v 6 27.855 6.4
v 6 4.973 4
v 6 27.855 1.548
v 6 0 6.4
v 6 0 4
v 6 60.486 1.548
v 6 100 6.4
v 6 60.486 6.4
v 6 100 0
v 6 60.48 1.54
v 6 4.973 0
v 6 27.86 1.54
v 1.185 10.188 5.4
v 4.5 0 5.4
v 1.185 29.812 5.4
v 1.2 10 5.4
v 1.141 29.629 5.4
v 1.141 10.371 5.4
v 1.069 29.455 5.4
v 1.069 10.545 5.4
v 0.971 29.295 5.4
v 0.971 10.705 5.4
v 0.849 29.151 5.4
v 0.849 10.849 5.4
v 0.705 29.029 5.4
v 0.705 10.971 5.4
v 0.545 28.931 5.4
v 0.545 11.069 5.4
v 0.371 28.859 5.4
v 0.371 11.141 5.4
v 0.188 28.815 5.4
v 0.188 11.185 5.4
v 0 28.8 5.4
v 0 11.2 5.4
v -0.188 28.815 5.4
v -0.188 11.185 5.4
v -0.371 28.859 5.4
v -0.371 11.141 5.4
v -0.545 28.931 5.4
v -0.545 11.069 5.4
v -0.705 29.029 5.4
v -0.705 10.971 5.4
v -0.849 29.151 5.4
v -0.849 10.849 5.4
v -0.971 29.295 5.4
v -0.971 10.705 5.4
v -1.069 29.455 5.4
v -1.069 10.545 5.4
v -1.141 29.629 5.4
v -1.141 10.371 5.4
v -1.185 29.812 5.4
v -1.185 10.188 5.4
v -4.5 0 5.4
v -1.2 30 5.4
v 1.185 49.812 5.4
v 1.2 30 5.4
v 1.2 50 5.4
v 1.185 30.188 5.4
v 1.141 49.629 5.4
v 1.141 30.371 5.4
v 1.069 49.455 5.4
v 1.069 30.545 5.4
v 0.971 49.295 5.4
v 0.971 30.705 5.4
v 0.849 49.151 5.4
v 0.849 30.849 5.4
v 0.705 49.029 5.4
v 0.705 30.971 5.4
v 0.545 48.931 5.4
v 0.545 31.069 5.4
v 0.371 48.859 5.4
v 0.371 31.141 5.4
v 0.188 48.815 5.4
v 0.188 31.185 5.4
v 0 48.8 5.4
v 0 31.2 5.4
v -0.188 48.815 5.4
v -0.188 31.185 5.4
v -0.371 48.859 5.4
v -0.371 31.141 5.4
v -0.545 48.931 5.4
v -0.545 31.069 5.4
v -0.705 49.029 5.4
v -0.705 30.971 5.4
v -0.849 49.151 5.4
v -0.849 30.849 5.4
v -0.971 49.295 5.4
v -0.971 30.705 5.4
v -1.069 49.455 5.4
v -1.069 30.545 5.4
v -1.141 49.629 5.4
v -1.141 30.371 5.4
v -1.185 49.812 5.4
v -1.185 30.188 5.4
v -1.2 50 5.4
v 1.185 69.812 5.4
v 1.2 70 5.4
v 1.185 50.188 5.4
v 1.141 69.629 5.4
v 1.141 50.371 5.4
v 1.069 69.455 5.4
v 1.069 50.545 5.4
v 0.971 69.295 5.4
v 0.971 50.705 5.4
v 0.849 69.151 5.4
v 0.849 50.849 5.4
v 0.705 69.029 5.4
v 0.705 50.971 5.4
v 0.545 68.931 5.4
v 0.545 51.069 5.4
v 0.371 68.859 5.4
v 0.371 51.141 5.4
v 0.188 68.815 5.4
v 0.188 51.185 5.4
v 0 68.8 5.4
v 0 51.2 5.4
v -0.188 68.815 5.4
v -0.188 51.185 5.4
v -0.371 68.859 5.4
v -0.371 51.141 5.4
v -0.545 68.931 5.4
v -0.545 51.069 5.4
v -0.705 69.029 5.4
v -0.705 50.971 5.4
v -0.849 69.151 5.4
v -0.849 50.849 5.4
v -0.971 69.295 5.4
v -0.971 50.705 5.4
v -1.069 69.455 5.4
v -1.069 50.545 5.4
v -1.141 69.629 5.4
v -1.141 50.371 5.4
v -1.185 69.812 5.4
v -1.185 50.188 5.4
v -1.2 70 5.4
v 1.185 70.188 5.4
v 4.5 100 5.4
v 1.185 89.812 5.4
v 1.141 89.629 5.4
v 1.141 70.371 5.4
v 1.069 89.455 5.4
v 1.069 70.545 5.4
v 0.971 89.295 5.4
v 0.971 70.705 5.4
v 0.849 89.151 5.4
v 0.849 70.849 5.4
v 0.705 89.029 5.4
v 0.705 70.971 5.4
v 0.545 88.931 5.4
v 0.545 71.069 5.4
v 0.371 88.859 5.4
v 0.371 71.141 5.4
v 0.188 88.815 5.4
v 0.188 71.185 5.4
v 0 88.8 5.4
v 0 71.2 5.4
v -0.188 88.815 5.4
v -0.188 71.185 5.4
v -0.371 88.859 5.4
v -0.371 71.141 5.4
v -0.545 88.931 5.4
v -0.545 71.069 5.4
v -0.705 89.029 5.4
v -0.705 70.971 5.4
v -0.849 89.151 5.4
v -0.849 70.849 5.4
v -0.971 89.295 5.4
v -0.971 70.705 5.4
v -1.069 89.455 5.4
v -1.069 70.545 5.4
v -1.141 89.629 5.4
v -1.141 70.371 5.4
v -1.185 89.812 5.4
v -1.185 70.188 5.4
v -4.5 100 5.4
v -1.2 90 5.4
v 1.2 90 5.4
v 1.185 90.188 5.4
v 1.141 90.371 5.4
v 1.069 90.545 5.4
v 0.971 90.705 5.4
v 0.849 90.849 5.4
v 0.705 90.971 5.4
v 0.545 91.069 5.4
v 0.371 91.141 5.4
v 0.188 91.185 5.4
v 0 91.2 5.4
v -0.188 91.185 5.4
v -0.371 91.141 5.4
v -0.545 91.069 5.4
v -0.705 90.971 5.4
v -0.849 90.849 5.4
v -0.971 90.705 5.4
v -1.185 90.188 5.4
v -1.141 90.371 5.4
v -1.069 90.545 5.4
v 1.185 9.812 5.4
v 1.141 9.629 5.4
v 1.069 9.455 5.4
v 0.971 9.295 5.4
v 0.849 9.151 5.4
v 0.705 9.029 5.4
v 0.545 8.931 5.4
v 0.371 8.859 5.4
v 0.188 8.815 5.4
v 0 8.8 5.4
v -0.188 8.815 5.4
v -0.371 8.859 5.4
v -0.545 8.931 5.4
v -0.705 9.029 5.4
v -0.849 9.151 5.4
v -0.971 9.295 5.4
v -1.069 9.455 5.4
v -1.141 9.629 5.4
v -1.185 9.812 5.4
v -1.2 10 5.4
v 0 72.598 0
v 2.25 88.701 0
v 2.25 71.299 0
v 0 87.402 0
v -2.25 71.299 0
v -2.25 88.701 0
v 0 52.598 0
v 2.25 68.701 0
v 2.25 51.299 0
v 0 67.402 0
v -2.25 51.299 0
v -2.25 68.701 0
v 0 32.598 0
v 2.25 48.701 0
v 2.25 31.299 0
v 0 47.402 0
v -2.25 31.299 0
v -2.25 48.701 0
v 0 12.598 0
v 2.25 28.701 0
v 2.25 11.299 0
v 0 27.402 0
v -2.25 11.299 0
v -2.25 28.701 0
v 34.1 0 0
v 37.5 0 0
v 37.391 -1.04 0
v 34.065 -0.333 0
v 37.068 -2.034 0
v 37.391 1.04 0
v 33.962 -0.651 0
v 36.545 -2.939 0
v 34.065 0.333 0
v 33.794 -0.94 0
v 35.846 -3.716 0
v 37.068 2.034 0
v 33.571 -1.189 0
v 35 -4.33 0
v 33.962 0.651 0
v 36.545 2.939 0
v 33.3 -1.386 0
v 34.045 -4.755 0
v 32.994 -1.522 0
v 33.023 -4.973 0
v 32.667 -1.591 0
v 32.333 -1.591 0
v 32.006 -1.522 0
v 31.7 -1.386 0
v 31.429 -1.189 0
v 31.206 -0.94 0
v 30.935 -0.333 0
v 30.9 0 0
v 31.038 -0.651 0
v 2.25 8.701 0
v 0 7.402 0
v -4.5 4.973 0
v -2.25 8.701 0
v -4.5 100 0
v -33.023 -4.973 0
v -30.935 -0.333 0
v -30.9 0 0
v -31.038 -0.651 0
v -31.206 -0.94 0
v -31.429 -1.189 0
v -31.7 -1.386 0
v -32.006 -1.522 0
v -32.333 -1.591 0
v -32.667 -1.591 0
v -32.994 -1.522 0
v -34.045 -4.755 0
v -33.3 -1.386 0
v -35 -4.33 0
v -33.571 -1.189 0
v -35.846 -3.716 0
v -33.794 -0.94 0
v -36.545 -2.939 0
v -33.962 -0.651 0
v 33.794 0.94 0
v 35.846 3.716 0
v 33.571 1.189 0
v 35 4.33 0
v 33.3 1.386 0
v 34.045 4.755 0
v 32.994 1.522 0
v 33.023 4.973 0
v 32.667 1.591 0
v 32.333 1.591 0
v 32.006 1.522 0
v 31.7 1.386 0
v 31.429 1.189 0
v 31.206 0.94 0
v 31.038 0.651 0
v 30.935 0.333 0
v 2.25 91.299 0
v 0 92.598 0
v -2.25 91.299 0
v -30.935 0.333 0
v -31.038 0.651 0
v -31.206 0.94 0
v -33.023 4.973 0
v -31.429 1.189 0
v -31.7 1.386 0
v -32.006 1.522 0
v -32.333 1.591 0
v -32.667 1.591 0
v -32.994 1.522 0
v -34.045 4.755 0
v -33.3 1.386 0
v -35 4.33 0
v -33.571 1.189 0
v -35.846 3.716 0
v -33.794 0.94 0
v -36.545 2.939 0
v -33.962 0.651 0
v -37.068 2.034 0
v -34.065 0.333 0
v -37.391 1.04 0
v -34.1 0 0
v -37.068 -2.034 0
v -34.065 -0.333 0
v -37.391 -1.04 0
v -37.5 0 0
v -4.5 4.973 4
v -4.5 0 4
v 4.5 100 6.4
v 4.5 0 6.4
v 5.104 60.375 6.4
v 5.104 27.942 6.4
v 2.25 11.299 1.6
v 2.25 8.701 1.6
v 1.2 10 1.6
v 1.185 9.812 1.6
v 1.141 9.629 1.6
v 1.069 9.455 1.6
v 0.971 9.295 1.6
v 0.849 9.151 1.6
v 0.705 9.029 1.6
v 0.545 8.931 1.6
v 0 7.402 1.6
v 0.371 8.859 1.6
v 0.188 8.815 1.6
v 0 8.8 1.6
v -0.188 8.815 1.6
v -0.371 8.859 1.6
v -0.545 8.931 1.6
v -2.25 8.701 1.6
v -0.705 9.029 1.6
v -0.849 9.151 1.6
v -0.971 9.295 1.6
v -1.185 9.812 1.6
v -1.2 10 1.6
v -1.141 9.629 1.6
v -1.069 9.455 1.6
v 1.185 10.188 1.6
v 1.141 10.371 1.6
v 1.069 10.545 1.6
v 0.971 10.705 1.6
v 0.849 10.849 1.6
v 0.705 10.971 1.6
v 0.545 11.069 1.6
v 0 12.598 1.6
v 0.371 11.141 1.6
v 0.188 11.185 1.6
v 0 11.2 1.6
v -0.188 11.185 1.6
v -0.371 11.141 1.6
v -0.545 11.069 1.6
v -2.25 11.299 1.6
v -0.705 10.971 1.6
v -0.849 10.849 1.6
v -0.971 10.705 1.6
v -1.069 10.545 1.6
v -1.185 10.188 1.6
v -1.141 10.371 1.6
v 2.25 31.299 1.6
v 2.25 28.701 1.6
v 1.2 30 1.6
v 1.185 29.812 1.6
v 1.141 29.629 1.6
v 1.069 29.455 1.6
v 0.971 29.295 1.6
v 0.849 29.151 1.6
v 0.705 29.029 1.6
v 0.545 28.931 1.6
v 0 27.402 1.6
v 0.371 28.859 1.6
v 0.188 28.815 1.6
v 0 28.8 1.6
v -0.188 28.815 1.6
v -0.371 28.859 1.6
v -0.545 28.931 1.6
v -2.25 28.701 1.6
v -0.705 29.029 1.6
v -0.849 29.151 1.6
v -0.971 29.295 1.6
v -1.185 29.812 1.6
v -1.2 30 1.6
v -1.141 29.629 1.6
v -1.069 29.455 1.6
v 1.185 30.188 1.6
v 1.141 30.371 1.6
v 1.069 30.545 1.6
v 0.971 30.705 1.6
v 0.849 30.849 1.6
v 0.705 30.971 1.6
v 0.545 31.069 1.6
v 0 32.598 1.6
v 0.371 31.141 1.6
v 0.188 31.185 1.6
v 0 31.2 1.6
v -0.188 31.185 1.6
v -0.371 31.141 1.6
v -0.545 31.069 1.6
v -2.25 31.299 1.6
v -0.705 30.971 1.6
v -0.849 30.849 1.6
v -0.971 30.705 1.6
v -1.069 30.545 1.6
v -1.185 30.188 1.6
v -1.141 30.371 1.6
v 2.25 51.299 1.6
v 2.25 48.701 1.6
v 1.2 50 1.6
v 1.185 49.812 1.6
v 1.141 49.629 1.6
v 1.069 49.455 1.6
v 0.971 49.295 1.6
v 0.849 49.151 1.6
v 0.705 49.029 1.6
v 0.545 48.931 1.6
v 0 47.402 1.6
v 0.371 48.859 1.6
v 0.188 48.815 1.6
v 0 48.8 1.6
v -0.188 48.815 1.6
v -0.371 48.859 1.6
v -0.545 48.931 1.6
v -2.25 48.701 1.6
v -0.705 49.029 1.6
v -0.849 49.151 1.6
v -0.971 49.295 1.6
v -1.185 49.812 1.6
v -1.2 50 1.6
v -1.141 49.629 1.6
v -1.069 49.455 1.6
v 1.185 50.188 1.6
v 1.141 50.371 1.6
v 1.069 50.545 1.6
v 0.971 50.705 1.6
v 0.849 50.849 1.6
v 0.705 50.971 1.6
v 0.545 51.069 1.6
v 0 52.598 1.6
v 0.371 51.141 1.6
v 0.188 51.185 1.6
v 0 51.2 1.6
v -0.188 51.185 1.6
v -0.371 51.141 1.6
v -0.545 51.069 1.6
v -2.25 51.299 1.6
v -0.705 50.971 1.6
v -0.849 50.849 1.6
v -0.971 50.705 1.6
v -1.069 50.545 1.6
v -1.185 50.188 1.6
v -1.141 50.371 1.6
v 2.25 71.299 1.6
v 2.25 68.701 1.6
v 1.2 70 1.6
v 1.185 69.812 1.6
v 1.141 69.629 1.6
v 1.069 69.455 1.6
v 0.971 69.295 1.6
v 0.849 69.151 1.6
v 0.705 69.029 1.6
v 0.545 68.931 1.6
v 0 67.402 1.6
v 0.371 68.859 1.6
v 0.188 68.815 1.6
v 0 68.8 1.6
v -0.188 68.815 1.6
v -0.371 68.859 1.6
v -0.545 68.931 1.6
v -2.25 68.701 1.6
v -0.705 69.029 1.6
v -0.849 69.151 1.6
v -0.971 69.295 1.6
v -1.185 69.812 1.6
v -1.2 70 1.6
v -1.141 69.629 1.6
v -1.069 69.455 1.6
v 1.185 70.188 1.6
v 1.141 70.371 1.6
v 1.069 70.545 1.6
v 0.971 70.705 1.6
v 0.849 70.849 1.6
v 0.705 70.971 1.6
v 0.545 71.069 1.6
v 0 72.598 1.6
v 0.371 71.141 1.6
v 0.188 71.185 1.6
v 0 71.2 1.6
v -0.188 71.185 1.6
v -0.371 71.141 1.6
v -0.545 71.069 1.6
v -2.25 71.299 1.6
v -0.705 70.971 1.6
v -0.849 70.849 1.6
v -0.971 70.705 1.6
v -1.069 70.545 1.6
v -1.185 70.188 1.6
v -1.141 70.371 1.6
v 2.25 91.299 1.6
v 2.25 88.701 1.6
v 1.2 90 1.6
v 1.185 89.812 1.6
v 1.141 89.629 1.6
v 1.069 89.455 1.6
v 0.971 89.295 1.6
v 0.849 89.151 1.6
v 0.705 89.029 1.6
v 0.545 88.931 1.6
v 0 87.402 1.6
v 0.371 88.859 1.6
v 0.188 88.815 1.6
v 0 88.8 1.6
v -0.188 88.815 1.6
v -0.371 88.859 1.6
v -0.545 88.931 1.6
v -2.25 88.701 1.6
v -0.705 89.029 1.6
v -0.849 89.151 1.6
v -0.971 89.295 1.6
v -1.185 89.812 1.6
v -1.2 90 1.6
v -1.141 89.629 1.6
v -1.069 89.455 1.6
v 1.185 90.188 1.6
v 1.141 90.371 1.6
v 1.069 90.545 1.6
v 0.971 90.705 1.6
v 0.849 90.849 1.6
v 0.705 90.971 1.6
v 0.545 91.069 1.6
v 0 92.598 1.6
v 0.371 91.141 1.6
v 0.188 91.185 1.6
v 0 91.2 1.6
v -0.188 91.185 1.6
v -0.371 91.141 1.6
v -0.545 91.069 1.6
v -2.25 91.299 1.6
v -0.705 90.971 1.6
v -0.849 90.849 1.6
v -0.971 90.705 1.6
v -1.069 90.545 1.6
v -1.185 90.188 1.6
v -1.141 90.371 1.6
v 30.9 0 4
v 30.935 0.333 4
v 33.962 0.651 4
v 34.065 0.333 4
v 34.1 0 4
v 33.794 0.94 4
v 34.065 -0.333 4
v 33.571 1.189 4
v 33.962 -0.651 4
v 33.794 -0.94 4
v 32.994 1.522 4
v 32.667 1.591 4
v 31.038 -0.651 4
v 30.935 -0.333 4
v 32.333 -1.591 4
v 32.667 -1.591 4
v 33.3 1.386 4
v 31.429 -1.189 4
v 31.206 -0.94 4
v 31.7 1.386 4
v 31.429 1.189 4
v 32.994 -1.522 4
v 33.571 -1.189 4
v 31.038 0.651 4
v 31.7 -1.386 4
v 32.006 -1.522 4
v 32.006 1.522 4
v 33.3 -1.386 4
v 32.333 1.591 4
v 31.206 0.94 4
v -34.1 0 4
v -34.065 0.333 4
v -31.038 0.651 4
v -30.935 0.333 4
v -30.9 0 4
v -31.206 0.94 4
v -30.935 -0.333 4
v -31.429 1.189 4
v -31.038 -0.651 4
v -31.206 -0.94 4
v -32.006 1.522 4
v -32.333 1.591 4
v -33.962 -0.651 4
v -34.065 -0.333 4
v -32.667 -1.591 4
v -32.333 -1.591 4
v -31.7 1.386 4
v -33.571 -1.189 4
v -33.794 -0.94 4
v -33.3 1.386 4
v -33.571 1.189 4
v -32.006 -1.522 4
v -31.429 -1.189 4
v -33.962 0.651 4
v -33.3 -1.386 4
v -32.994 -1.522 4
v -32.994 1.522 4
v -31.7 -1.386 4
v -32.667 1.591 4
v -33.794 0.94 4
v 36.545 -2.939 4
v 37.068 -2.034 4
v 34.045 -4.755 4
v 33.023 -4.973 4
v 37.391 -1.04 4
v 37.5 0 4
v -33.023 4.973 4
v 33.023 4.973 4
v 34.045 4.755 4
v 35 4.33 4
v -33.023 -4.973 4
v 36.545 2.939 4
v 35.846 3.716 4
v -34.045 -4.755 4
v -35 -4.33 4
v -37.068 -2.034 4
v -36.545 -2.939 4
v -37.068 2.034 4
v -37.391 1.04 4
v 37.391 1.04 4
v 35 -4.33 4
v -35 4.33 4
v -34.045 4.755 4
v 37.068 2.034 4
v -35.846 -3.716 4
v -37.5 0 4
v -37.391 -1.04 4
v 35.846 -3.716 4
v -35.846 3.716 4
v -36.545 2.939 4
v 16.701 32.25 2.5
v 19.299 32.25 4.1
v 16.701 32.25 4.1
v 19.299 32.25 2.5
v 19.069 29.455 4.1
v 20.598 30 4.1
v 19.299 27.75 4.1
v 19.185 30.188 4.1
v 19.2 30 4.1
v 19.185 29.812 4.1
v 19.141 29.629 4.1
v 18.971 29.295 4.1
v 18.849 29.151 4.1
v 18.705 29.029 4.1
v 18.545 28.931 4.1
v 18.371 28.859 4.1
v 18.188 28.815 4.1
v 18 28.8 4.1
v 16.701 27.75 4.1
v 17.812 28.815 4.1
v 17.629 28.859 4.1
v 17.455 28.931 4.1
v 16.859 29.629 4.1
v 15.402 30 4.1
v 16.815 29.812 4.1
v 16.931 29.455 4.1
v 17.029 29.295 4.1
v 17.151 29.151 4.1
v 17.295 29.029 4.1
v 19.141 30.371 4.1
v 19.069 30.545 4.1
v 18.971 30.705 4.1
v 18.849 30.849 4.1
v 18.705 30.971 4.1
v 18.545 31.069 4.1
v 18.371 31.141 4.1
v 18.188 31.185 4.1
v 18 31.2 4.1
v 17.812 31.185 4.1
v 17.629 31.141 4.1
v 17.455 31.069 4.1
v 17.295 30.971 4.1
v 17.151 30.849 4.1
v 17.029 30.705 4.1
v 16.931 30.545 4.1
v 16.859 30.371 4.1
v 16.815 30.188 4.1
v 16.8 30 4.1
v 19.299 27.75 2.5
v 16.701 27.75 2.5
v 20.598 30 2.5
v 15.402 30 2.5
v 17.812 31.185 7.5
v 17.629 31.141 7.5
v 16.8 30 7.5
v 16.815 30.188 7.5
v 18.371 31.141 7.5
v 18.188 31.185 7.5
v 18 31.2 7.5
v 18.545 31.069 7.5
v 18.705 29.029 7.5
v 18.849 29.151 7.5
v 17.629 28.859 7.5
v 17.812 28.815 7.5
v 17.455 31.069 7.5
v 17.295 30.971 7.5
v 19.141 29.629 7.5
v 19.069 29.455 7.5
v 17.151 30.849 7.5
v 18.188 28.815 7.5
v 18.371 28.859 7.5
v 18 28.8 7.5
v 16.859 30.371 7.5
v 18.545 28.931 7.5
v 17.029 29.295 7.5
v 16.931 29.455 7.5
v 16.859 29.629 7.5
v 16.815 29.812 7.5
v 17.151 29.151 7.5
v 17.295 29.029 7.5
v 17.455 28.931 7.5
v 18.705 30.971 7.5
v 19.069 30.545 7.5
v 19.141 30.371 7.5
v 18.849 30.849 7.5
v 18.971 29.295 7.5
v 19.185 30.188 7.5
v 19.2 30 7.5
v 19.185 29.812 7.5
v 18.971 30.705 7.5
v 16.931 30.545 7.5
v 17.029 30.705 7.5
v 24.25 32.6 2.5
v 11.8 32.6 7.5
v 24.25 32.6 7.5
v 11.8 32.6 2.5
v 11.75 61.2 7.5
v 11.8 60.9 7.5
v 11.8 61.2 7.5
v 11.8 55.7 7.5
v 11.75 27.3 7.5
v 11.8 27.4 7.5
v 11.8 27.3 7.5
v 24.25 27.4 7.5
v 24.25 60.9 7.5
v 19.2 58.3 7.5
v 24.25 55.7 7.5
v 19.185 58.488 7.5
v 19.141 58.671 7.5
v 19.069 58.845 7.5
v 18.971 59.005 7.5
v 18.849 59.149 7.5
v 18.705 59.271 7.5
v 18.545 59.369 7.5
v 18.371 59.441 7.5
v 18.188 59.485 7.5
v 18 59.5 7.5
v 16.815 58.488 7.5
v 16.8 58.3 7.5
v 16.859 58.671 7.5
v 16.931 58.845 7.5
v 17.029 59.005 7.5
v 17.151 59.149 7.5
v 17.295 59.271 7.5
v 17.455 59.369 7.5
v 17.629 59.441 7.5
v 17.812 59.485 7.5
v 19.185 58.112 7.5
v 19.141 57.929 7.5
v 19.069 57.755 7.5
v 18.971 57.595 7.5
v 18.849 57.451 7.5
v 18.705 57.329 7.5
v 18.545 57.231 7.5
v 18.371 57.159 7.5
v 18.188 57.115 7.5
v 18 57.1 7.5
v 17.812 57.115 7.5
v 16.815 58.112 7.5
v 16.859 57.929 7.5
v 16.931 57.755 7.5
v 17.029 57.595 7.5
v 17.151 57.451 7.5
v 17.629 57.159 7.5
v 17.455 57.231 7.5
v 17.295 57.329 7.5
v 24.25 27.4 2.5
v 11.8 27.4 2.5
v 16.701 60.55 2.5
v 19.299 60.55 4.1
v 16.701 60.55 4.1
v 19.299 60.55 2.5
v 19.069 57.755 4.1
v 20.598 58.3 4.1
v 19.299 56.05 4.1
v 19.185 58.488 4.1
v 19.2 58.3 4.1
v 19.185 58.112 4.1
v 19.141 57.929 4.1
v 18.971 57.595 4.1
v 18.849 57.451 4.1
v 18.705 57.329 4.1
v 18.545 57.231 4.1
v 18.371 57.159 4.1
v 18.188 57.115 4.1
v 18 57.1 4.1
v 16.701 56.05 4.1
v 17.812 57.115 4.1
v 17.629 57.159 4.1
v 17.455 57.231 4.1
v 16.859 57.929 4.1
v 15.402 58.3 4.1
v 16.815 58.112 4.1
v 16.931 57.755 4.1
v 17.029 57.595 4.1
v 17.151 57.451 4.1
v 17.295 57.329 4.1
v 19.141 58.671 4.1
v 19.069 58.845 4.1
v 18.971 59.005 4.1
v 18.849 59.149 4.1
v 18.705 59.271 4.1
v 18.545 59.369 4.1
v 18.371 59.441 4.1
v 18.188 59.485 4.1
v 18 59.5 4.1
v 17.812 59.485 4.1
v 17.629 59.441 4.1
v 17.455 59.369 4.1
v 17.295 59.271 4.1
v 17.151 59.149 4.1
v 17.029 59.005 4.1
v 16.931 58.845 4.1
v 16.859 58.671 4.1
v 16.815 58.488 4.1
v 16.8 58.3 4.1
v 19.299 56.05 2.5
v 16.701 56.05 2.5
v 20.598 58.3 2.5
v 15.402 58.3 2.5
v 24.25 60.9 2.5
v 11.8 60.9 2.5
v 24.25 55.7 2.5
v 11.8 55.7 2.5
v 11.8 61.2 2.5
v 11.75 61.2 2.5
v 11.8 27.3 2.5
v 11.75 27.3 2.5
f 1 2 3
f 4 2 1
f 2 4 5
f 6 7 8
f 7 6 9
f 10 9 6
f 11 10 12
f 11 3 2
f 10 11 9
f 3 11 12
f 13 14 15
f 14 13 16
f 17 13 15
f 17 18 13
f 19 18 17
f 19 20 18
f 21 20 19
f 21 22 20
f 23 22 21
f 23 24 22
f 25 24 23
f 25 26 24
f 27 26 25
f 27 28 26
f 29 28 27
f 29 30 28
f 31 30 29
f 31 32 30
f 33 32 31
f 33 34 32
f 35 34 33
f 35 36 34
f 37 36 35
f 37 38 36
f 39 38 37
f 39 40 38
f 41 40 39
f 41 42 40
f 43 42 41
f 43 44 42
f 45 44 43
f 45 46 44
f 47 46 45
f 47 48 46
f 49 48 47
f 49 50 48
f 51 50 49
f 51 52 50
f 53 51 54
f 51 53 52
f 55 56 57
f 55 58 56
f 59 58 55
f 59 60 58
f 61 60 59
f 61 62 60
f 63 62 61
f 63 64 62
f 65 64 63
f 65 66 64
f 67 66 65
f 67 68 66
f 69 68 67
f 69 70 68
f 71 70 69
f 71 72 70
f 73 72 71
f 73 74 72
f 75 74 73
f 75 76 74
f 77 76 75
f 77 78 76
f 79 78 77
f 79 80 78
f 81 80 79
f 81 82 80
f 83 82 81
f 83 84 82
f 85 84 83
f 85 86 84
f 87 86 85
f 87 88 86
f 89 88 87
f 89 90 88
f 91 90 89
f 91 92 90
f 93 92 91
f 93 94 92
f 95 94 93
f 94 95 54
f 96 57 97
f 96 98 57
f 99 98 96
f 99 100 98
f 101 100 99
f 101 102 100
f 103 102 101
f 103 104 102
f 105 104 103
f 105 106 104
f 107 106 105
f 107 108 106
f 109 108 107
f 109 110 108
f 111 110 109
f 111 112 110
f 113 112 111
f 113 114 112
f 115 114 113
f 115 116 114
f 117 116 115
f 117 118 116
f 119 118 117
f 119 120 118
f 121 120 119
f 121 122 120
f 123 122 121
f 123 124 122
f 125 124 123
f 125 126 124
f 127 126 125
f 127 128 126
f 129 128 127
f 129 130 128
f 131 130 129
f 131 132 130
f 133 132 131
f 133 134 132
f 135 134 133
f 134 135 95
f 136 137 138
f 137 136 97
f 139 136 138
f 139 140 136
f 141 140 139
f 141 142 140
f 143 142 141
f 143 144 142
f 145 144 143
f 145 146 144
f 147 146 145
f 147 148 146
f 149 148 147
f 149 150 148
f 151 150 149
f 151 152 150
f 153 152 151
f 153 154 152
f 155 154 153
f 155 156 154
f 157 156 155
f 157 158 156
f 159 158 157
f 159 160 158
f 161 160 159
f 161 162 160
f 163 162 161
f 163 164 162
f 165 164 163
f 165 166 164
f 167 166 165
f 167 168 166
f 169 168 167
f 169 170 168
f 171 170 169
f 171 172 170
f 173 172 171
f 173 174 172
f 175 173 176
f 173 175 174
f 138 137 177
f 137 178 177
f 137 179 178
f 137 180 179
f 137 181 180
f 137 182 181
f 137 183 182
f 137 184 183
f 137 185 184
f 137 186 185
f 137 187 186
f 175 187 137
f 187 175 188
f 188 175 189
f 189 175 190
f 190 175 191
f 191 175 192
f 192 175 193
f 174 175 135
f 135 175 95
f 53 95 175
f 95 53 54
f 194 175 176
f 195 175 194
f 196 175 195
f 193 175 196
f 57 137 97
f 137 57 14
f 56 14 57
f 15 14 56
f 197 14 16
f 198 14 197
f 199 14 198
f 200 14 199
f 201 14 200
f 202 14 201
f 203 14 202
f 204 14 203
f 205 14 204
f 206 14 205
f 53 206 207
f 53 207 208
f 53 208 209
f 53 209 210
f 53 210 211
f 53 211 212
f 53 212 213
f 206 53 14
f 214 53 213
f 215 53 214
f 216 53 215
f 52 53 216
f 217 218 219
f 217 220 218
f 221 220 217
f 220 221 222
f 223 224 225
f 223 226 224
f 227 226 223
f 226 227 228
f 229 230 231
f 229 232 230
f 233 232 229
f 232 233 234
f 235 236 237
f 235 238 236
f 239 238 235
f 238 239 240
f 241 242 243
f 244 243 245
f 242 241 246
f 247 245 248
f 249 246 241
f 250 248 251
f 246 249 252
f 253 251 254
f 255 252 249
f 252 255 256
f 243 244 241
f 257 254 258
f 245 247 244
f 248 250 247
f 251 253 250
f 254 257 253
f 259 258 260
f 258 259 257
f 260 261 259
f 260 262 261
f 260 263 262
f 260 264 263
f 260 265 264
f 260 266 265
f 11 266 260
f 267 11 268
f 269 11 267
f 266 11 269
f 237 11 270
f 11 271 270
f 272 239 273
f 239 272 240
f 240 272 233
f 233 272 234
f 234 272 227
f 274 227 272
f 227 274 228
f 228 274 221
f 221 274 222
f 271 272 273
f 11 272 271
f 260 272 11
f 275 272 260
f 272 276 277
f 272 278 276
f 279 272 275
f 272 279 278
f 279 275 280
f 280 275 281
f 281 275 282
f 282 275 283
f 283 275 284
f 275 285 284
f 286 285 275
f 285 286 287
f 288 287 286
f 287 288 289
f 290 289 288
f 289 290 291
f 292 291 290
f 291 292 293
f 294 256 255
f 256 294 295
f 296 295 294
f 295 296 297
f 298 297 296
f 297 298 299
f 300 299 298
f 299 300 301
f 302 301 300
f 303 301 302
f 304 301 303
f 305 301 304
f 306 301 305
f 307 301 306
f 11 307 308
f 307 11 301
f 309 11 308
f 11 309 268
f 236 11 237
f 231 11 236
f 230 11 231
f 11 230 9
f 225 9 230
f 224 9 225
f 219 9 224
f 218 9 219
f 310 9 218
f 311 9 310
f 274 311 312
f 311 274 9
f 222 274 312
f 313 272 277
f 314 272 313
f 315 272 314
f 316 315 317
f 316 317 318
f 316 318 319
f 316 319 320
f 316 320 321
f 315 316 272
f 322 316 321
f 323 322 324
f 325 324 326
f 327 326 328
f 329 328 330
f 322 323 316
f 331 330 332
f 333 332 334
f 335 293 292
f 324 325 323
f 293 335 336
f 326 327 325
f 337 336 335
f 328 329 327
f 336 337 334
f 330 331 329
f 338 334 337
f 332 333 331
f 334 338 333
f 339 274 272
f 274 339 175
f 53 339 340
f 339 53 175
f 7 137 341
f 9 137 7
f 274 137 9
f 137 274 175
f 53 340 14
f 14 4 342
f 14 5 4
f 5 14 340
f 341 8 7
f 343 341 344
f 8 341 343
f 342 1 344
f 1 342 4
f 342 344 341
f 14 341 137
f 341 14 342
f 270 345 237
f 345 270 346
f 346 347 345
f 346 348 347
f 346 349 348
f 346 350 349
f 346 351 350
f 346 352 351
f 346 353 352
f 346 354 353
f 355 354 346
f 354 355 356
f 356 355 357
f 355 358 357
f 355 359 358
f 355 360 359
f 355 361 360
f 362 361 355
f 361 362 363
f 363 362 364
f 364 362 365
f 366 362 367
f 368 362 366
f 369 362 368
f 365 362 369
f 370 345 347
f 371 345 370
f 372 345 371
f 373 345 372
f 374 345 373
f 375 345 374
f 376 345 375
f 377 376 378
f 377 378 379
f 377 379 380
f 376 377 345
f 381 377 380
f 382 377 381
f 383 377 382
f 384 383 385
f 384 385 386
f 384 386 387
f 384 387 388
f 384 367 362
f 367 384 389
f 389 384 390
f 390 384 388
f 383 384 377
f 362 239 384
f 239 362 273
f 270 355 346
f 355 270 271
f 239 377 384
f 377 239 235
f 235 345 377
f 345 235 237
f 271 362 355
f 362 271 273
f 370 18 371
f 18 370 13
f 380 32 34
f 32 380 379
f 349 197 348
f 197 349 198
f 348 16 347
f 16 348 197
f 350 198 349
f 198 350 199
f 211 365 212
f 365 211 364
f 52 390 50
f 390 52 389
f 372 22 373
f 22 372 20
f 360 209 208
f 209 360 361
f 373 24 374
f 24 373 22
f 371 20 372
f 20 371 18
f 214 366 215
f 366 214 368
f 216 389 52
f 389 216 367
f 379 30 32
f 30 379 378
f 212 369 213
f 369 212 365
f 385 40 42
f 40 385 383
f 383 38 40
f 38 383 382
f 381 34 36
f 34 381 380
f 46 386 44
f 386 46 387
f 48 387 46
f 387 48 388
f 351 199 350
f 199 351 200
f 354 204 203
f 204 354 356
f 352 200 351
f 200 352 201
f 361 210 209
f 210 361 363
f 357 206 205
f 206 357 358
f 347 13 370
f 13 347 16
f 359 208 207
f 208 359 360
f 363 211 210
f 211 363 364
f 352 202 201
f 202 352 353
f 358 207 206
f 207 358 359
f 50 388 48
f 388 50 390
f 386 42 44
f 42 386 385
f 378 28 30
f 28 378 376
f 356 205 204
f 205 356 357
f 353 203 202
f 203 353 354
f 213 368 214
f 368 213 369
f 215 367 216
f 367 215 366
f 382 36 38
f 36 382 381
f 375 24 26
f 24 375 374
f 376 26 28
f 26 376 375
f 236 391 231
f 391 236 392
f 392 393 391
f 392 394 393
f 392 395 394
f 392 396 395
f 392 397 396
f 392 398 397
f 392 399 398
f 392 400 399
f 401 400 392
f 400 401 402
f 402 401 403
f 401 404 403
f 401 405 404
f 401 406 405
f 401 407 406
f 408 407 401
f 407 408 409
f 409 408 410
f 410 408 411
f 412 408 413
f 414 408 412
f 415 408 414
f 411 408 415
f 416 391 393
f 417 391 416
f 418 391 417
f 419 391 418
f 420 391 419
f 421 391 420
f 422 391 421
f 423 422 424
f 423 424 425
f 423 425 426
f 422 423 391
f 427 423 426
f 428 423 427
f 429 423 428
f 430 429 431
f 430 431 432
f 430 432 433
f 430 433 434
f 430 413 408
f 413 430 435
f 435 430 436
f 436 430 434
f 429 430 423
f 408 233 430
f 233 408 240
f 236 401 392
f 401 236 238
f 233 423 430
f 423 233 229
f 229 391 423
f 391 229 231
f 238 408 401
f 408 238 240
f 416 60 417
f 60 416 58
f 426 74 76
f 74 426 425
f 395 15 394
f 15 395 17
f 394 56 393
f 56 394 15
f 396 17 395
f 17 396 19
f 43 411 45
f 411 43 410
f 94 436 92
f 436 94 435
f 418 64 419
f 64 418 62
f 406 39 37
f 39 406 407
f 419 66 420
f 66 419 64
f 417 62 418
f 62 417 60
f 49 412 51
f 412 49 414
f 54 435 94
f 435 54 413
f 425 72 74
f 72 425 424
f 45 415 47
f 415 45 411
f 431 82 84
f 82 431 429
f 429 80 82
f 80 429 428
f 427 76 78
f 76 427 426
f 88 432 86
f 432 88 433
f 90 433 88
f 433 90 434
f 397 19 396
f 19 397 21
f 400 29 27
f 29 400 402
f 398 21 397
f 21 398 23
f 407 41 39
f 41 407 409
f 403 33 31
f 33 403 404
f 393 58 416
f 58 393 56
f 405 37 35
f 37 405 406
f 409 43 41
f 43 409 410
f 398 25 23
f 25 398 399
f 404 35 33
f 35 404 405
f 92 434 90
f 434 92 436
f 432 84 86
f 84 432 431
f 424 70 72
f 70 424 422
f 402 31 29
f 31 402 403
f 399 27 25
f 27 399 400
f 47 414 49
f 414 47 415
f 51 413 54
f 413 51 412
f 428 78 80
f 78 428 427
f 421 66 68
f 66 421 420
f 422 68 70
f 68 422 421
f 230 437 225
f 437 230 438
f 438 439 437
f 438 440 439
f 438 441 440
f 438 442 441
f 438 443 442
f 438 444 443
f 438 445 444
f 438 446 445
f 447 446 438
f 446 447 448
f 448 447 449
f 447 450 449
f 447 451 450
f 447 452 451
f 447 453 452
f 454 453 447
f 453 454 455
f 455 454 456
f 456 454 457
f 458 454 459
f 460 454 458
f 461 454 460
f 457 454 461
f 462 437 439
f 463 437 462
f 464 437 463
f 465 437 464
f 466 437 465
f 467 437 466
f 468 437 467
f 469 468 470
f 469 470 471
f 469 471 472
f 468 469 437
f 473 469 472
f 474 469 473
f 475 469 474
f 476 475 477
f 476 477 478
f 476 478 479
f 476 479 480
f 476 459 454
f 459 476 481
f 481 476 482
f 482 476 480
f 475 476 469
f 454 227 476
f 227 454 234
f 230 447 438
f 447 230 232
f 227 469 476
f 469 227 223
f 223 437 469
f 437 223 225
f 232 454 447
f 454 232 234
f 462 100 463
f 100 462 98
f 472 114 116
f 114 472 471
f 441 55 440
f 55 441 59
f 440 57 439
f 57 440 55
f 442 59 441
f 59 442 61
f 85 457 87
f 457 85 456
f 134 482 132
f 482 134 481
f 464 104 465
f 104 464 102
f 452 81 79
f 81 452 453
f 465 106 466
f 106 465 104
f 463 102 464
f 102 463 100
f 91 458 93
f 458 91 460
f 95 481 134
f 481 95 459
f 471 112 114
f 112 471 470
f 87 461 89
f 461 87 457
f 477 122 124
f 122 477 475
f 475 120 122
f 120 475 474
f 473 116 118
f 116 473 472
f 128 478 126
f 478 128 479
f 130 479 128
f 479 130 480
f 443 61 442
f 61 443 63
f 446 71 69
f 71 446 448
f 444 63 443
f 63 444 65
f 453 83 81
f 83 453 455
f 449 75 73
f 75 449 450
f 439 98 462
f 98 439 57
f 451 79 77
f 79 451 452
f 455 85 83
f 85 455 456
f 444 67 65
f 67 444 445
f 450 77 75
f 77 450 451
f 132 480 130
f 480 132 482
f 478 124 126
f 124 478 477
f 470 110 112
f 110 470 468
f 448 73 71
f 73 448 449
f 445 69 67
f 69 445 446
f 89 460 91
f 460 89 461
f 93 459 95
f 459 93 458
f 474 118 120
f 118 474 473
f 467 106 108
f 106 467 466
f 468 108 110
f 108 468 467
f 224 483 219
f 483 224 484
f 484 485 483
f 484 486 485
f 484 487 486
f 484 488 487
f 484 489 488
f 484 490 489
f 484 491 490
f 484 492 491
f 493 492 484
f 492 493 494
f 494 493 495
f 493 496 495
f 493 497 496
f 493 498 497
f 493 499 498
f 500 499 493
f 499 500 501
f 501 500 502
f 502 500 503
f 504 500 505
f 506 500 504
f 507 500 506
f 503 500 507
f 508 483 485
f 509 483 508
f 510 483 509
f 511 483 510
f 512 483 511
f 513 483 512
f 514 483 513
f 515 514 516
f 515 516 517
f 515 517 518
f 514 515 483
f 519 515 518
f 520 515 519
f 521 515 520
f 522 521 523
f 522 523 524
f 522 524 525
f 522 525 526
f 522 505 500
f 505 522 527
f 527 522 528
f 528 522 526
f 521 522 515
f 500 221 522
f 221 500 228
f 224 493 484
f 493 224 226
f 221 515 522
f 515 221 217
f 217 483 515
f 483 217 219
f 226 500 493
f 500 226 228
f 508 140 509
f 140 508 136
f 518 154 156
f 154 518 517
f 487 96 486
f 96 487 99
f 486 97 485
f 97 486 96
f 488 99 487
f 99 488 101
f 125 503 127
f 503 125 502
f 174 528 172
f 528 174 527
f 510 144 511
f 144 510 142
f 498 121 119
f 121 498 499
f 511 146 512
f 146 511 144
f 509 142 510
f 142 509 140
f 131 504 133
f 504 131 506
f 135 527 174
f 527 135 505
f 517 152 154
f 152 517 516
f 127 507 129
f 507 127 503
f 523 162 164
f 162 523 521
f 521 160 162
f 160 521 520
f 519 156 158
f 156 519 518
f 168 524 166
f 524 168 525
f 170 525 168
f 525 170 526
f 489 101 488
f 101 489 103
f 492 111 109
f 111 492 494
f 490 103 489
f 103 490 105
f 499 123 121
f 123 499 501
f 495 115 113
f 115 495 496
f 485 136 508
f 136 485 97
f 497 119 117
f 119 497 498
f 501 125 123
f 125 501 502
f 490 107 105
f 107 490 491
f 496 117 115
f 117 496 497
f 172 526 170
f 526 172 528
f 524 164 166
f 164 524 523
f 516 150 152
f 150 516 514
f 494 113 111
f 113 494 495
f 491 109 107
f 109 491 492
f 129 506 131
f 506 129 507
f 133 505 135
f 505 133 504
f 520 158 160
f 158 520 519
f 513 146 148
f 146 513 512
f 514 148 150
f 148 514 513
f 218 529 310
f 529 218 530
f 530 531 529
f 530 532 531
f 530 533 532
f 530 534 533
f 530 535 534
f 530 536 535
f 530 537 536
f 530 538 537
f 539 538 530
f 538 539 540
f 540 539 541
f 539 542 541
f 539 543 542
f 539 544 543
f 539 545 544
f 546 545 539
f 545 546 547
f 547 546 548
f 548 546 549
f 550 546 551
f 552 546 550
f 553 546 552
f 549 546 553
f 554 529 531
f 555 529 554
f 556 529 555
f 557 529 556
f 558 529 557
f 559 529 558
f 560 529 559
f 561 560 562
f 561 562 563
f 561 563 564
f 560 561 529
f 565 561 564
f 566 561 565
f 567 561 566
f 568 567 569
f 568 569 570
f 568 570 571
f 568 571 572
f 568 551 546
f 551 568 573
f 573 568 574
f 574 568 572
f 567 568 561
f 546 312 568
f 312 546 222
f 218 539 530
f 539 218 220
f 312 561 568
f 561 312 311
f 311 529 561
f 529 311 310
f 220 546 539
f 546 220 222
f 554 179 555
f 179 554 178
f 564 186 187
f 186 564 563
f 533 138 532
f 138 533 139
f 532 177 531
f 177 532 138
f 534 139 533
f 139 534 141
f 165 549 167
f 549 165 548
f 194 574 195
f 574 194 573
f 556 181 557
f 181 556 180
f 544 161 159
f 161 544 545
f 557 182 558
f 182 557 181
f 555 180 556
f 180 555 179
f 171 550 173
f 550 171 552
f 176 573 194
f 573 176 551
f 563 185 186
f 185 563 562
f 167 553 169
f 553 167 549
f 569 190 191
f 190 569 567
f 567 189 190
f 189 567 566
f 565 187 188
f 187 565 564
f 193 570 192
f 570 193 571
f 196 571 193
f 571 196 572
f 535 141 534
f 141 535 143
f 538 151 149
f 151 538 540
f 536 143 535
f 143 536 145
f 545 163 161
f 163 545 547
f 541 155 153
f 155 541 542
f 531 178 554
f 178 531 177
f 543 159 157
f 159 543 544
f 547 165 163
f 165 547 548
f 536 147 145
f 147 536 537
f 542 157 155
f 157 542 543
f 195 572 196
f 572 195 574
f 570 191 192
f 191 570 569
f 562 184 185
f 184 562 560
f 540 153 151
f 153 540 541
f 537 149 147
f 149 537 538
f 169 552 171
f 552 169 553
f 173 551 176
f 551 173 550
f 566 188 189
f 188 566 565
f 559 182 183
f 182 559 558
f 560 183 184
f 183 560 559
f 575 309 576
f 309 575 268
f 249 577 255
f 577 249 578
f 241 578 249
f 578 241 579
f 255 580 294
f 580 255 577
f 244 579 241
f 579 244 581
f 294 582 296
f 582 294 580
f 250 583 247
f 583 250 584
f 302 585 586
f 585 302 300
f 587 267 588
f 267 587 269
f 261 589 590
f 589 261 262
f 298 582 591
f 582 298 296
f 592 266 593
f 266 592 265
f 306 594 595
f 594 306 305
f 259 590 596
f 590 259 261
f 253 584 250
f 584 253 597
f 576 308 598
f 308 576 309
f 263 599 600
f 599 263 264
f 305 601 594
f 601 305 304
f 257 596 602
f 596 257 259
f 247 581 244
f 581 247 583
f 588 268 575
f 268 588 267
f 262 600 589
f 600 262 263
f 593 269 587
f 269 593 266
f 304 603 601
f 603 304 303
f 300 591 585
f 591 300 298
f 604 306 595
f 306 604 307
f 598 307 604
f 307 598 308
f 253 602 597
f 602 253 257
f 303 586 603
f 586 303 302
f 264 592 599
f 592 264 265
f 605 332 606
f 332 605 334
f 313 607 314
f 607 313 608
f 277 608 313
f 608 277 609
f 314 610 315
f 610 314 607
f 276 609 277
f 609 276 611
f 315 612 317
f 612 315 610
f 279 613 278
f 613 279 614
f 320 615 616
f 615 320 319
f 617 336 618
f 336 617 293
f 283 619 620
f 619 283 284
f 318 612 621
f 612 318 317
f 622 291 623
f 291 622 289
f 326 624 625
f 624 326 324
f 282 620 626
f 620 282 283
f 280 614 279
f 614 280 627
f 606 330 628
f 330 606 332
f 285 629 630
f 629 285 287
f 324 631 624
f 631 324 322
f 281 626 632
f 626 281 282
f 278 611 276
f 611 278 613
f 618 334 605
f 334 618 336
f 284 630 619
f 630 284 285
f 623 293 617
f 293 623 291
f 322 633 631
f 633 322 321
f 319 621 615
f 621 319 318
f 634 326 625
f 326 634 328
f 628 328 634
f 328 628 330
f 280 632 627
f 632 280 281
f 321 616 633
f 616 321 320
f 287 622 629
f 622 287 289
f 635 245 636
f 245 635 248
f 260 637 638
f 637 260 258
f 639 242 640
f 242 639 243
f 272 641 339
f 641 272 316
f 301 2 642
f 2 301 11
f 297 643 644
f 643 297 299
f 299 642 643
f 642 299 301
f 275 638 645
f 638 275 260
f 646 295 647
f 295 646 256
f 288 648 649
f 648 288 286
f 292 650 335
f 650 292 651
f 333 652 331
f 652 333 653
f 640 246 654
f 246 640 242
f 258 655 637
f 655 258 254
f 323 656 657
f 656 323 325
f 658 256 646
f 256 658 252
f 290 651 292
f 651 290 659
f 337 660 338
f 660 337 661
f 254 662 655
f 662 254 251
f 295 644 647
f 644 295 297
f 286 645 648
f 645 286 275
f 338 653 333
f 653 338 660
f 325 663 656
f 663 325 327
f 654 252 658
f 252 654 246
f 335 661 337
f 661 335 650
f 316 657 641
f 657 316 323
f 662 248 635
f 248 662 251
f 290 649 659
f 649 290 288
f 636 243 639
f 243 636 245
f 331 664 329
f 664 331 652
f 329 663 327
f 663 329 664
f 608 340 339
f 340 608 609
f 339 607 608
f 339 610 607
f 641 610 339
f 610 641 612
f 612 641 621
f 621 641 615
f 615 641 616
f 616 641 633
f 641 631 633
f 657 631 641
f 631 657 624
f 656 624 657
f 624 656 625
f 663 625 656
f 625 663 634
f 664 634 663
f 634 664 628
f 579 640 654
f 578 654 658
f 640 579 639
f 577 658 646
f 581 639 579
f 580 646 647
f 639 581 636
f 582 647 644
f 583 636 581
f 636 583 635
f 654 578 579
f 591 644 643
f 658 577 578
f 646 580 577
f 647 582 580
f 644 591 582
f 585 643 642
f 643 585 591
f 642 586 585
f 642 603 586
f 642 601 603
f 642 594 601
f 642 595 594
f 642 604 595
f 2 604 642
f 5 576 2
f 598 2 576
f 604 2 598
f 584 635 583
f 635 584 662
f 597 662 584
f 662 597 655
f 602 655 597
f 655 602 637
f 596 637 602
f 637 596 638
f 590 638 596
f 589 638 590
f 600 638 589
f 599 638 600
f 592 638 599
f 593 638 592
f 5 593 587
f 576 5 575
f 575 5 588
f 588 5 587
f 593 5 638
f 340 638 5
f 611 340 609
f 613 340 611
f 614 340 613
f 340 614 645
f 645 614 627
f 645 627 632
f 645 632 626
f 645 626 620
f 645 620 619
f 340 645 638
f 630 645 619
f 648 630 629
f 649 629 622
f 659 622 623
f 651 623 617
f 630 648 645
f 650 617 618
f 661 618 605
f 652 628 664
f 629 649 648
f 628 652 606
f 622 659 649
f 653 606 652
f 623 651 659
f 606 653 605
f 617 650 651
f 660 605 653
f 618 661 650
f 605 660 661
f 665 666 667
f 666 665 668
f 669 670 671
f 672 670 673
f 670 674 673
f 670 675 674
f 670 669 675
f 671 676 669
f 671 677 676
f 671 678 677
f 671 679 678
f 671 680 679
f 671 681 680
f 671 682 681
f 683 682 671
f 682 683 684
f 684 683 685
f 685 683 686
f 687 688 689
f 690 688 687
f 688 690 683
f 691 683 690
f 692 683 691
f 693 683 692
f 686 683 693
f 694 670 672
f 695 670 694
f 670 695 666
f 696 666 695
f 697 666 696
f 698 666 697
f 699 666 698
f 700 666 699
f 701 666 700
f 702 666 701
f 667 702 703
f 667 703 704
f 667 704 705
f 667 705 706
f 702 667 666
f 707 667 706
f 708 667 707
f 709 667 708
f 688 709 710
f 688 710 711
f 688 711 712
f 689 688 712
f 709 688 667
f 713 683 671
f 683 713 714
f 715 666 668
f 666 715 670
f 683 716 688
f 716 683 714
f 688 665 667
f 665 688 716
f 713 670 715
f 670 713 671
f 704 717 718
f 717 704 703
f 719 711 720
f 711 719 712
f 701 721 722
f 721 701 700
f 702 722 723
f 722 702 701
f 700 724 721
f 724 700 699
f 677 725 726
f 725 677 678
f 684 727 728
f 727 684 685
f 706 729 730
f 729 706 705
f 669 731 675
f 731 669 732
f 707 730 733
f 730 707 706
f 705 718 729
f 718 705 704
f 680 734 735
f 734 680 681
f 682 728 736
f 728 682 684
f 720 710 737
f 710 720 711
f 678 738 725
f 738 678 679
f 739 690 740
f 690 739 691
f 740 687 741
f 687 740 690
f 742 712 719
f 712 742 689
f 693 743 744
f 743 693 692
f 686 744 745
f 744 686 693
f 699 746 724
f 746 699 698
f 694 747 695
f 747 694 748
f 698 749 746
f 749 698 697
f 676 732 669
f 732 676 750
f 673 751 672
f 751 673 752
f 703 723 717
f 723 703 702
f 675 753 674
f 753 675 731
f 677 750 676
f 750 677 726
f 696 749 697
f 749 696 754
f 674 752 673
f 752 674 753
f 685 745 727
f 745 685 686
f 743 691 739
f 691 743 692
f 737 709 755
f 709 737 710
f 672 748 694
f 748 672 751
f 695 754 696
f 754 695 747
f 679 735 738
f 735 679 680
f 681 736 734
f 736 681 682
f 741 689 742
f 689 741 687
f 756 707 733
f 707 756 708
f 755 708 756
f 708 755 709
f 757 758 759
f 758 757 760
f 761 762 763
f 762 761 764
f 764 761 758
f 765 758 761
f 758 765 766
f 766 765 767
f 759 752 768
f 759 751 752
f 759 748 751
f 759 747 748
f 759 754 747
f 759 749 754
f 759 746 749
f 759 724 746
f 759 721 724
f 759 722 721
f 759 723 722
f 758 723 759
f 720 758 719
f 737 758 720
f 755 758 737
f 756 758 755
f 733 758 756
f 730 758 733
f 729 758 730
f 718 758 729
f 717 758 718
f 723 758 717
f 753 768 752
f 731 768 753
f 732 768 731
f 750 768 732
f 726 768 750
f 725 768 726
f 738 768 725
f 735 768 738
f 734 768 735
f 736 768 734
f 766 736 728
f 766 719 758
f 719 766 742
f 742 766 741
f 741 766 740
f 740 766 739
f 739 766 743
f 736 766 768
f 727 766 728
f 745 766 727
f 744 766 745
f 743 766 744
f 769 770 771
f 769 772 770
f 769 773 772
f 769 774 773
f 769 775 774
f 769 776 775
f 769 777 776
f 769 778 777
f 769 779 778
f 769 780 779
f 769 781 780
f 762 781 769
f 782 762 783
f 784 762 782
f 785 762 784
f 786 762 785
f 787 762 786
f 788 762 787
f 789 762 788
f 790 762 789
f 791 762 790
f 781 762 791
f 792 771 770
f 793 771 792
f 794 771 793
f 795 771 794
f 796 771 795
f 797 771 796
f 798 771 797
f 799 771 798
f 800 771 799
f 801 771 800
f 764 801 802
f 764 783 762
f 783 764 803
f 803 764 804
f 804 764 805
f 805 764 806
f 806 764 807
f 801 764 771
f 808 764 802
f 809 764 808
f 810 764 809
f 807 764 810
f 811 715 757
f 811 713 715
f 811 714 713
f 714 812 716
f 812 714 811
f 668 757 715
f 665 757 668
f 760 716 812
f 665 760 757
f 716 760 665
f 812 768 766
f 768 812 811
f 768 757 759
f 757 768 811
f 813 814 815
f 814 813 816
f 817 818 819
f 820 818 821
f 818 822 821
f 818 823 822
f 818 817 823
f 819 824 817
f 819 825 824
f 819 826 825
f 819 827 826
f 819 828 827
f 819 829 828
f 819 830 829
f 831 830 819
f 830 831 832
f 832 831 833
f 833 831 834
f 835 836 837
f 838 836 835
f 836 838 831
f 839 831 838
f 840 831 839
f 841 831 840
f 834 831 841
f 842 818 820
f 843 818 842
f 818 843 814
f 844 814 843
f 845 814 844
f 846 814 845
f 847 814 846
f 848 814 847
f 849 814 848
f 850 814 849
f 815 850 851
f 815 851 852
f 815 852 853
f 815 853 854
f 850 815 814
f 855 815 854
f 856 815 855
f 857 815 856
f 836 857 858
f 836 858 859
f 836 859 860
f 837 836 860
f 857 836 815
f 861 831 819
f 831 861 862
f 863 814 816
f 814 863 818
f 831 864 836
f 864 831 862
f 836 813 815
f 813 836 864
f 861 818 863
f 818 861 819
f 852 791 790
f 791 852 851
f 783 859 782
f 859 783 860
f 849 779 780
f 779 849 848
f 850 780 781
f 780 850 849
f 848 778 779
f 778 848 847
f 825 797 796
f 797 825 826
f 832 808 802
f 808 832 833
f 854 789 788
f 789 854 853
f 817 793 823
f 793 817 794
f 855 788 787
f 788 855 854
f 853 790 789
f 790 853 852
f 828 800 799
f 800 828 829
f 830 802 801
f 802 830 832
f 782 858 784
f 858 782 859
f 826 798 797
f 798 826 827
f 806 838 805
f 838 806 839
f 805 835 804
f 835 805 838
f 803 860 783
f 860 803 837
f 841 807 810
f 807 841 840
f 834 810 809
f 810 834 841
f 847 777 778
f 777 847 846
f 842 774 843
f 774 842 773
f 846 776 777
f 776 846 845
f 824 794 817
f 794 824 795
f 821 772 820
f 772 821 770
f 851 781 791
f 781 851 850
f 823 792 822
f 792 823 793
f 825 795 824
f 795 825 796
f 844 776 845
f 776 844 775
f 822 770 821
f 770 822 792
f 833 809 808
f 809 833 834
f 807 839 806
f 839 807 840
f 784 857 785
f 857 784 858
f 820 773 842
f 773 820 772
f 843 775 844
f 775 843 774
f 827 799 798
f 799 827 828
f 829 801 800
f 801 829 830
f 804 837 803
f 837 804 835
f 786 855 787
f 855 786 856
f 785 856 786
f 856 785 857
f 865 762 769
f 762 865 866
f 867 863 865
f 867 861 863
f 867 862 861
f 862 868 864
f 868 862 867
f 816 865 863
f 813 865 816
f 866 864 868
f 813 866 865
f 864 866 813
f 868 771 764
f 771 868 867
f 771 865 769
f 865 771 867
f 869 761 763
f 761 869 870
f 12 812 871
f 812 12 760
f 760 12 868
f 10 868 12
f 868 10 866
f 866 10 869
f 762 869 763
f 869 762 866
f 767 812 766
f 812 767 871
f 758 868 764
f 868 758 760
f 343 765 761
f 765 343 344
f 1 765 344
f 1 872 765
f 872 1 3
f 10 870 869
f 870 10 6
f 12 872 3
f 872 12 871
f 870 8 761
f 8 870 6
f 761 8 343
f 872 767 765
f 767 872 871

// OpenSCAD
// file: mounting.scad
m3_head_clearance = 5.3;
m3_screw_clearance = 3.2;
$fn=30;

module m3_bolt(bolt_len) {
    head_len=5;
    translate([0,0,bolt_len/2]) cylinder(d=m3_screw_clearance,h=bolt_len+0.05,center=true);
    translate([0,0,-head_len/2]) cylinder(d=m3_head_clearance,h=head_len,center=true);
}

module bolts(hole_distance,bolt_len) {
    translate([hole_distance/2,0,0]) m3_bolt(bolt_len);
    translate([-hole_distance/2,0,0]) m3_bolt(bolt_len);
}

// clearance between bolthole center and belt
upper_clearance = 5.0;

// measured parameters
hole_distance = 65.0;
bolt_len = 15.0;

module support(support_th) {
    difference() {
        hull() {
            translate([hole_distance/2,0,support_th/2])
                cylinder(r=upper_clearance,h=support_th,center=true);
            translate([-hole_distance/2,0,support_th/2])
                cylinder(r=upper_clearance,h=support_th,center=true);
        }
        translate([0,0,-0.05]) bolts(hole_distance, bolt_len);
    }
}

servo_screw_hole_d = 1.8;

support(2.5);
// file: sg90.scad
$fn=50;

// oriented facing up, with the center of the bottom
// on the XY plane

// error term for making sure tangent objects are fused
fuse = 0.0001;

// measurements
m_body_width = 23;
m_body_height = 22.1;
m_body_base_to_wingtop = 18.0;
m_body_wing_height = 2.5;
m_body_wingtip_to_wingtip = 32.1;
m_body_depth = 12.5;
m_cord_depth = 4;
m_cord_height = 3;
m_cord_zloc = 5.6;

m_boss_height = 5;
m_boss_diameter = 11.6;

m_horn_top = 31.4;
m_horn_base_diameter = 7.1;
m_horn_end_diameter = 3.5;
m_horn_length = 32;
m_horn_th = 1.3;

// ----- mounting holes ----
sg90_mounting_hole_dia = 2.5; // mm
sg90_mounting_hole_d_from_body = 2.65; // mm
sg90_mounting_hole_separation = m_body_width + sg90_mounting_hole_d_from_body * 2;

// The following are approximate, at best!

module sg90(horn_angle=0, cord_length=6) {
    body();
    cord(length = cord_length);
    boss();
    horn(angle=horn_angle);
}

// sg90 with the underside of the mounting hole farthest from the servo horn
// at the origin
module sg90_mount_origin() {
    translate([m_body_width/2 + sg90_mounting_hole_d_from_body,
	       0,
	       -m_body_base_to_wingtop + m_body_wing_height])
    sg90();
}

module horn(angle = 0) {
    horn_height = m_horn_top - (m_body_height + m_boss_height);
    translate([m_body_width/4,0,m_body_height+m_boss_height])
    rotate([0,0,angle])
    union() {
        cylinder(h=horn_height,
            d = m_horn_base_diameter);
        translate([0,0,horn_height - m_horn_th])        
        hull() {
            translate([m_horn_length/2,0,0])
            cylinder(h=m_horn_th, d = m_horn_end_diameter);
            translate([-m_horn_length/2,0,0])
            cylinder(h=m_horn_th, d = m_horn_end_diameter);
            cylinder(h=m_horn_th, d = m_horn_base_diameter);
        }
    }
}

module cord(length = 6) {
    // cord clearance
    translate([-fuse, 0, 0])
    translate([m_body_width/2,m_cord_depth-m_body_depth/2,
        m_cord_zloc-m_cord_height/2])
    cube([length, m_cord_depth, m_cord_height]);
}

module body() {
    translate([0,0,-fuse])
    translate([-m_body_width/2, -m_body_depth/2, 0])
    union() {
        cube([m_body_width, m_body_depth, m_body_height]);
        translate([-(m_body_wingtip_to_wingtip - m_body_width)/2,
            0, m_body_base_to_wingtop - m_body_wing_height])
        cube([m_body_wingtip_to_wingtip, 
            m_body_depth, m_body_wing_height]);
    }
}

module boss() {
    translate([0,0,m_body_height])
    hull() {
        cylinder(h=m_boss_height, d = m_boss_diameter);
        translate([m_body_width/4,0,0])
        cylinder(h=m_boss_height, d = m_boss_diameter);
    }        
}   

sg90_mount_origin();
// main file
use <sg90.scad>
use <mounting.scad>

// Constants

// ----- M2 fastener -----
m2_bolt_head_dia = 3.8; // mm
m2_bolt_head_clearance_dia = 4.4; // mm
m2_bolt_head_height = 2; // mm
m2_bolt_thread_dia = 2; // mm
m2_bolt_thread_clearance_dia = 2.4; // mm
m2_bolt_length = 10; // mm

// ----- Linear rail -----
rail_width = 9; // mm
rail_height = 6.3; // mm
rail_length = 100; // mm
m2_mounting_height = 4.6; // mm
rail_first_hole_offset = 10; // mm
rail_successive_offset = 20; // mm

// ----- M2 hex nut ------
m2_hex_width = 4; // mm
m2_hex_nut_depth = 1.6; // mm (usual depth)
m2_hex_width_clearance = 4.5; // mm

// ----- Linear rail support -----
rail_support_height =  m2_bolt_length - m2_mounting_height; // mm
// support has a lip at one end to help locate the rail vertically
rail_support_lip_width = 1.5; // mm
rail_support_lip_height = 1; // mm

module m2_fastener_hole(length = 20, head_ht = 20) {
    $fn = 40;
    // The hole is located with the origin at the base of the head.
    // The fastener is oriented with the thread in the -Z direction.
    cylinder(d=m2_bolt_head_clearance_dia, h=head_ht); // bolt head
    // threaded bolt
    translate([0,0,-length])
	cylinder(d=m2_bolt_thread_clearance_dia, h=length+0.1); // 0.1 adjustment to ensure overlap
}

// mock fastener for assembly testing
module m2_fastener(length = m2_bolt_length, head_ht = 2) {
    $fn = 40;
    // The hole is located with the origin at the base of the head.
    // The fastener is oriented with the thread in the -Z direction.
    cylinder(d=m2_bolt_head_dia, h=head_ht); // bolt head
    // threaded bolt
    translate([0,0,-length])
	cylinder(d=m2_bolt_thread_dia, h=length+0.1); // 0.1 adjustment to ensure overlap
}

module rail_holes(rail_length = 100, mocks=false) {
    // located from bottom center of one end of the rail; rail extends in +Y direction
    for (offset = [rail_first_hole_offset : rail_successive_offset : rail_length]) {
	translate([0,offset,m2_mounting_height])
	    if (mocks) m2_fastener();
	    else m2_fastener_hole();
    }
}

module rail_approximate(rail_length = 100) {
    color("red") difference() {
	translate([-rail_width/2,0,0])
	    cube([rail_width,rail_length,rail_height]);
	rail_holes();
    }
}

module m2_hex_nut_hole(depth=10) {
    // located from the center of the nut, bottom face
    $fn=40;
    intersection_for(theta = [0, 60, 120]) {
	rotate([0,0,theta])
	    translate([0,0,depth/2])
	    cube([m2_hex_width_clearance,100,depth],center=true);
    }
    translate([0,0,-20])
	cylinder(d=m2_bolt_thread_clearance_dia,h=40);
}

module rail_support(rail_length = 100) {
    difference() {
	union() { // rail support + lip
	    translate([-rail_width/2,0,0])
		cube([rail_width + rail_support_lip_width,
		      rail_length,
		      rail_support_height]);
	    translate([rail_width/2,0,rail_support_height])
		cube([rail_support_lip_width,
		      rail_length,
		      rail_support_lip_height]);
	}
	// holes for hex nuts
	for (offset = [rail_first_hole_offset : rail_successive_offset : rail_length]) {
	    translate([0,offset,m2_hex_nut_depth])
		rotate([180,0,0]) m2_hex_nut_hole();

	}
    }
}

//m2_hex_nut_hole();
translate([0,0,rail_support_height]) {
    // #color("green") rail_holes(mocks=true);	
    // #rail_approximate();
}
rail_support();
support(4);

// *** copied from sg90.scad, ugh "use" vs "import" ***
m_body_width = 23;
m_body_wing_height = 2.5;
m_body_depth = 12.5;

// ----- mounting holes ----
sg90_mounting_hole_dia = 2.5; // mm
sg90_mounting_hole_d_from_body = 2.65; // mm
sg90_mounting_hole_separation = m_body_width + sg90_mounting_hole_d_from_body * 2;

module sg90_support() {
    mount_th = 5;
    mount_w = (sg90_mounting_hole_d_from_body*2) - 0.1;
    mount_d = m_body_depth;
    module one_mount() {
	// located with origin at the top of the mounting hole
	difference() {
	    translate([0,0,-mount_th/2])
		cube([mount_w,mount_d,mount_th], center=true);
	    translate([0,0,-mount_th + m2_hex_nut_depth])
		rotate([180,0,0]) m2_hex_nut_hole();
	}
    }
    one_mount();
    translate([sg90_mounting_hole_separation,0,0]) one_mount();
}

sg90_support_height = 10 - m_body_wing_height;
translate([18,30,sg90_support_height]) {
    rotate([0,0,90]) {
	//# sg90_mount_origin();
	sg90_support();
    }
}
// bridge. this is hacky but whatevs, i'm busy
color("orange")
hull() {
    translate([18-m_body_depth/2,27.3,sg90_support_height-5])
	cube([0.05,5.6+sg90_mounting_hole_separation,5]);
    translate([rail_width/2,28,rail_height-5])
	cube([0.05,4+sg90_mounting_hole_separation,5]);
}
